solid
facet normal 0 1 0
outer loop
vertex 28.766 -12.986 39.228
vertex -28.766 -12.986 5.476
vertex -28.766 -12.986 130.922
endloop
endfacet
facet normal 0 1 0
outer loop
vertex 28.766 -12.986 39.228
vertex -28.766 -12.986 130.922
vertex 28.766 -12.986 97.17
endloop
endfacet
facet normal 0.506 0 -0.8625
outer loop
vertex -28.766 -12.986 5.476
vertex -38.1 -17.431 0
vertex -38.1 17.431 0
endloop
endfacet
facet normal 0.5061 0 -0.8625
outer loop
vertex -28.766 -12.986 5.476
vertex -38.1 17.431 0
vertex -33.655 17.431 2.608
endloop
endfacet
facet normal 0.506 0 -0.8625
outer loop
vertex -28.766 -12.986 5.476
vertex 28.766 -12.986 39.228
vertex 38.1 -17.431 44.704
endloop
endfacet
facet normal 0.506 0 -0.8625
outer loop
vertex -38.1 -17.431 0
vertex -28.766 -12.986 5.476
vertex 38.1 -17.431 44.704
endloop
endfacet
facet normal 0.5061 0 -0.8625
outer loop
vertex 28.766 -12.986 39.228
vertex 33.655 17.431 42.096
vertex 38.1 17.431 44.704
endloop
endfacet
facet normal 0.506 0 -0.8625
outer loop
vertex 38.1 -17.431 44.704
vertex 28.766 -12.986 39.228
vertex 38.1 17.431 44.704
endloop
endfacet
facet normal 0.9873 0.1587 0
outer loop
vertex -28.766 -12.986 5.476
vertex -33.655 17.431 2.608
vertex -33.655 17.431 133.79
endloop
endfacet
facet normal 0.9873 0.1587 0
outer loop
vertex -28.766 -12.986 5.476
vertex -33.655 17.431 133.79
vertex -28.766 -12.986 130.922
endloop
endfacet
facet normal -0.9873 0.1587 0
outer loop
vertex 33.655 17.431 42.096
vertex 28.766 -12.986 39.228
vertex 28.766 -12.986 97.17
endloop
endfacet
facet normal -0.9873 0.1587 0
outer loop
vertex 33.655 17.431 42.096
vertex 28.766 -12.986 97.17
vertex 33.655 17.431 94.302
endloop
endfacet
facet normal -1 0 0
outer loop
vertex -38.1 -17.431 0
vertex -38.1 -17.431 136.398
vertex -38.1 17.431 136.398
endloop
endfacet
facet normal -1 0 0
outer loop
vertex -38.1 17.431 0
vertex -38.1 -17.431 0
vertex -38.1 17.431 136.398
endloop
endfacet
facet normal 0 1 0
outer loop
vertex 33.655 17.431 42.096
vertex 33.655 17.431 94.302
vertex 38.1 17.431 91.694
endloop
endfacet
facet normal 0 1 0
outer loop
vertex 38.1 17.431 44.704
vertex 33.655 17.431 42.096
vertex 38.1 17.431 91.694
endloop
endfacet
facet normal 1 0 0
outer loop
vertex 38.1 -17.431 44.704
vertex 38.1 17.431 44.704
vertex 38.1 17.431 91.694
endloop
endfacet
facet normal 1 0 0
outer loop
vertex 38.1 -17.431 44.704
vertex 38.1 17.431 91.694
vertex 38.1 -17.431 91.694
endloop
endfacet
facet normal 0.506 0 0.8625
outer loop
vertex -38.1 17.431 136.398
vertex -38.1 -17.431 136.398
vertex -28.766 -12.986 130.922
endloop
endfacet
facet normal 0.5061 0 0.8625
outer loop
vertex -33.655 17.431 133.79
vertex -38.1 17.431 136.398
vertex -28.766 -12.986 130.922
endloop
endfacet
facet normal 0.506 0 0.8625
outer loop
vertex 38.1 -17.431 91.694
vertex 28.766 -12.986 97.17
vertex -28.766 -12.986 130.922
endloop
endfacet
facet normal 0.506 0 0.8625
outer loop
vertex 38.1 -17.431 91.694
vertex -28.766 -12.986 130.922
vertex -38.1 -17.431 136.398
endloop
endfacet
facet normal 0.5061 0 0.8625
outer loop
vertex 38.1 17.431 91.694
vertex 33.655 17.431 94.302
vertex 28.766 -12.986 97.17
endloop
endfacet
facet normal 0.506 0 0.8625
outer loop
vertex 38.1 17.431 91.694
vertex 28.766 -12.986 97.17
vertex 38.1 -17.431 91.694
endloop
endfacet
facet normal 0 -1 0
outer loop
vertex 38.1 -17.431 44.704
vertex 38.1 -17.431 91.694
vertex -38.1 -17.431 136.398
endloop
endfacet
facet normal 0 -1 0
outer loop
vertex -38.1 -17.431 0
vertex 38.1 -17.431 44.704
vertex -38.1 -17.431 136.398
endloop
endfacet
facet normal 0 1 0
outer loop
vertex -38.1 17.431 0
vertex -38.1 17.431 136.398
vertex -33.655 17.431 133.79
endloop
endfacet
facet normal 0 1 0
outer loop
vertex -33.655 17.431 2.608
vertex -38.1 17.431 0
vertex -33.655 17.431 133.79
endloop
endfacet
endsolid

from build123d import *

# Parameters (mm, degrees)
BOSS_EXTRUDE1_DEPTH     = 136.398
CUT_EXTRUDE1_DEPTH      = 18.43075
CUT_EXTRUDE1_DEPTH_BACK = 18.43075


with BuildPart() as part:
    # Sketch1 → Boss-Extrude1 (new body)
    with BuildSketch(Plane.XY):
        Polygon((-28.7655, -12.98575), (28.7655, -12.98575), (33.655, 17.43075), (38.1, 17.43075), (38.1, -17.43075), (-38.1, -17.43075), (-38.1, 17.43075), (-33.655, 17.43075), align=None)
    extrude(amount=BOSS_EXTRUDE1_DEPTH)

    # Sketch2 → Cut-Extrude1 (cut, two sides)
    with BuildSketch(Plane(origin=(0, 0, 0), x_dir=(1, 0, 0), z_dir=(0, 1, 0))) as cut_extrude1_sk:
        Polygon((-38.1, 0), (38.1, -44.704), (38.1, 0), align=None)
        Polygon((-38.1, -136.398), (38.1, -91.694), (38.1, -136.398), align=None)
    extrude(amount=CUT_EXTRUDE1_DEPTH, mode=Mode.SUBTRACT)
    extrude(cut_extrude1_sk.sketch, amount=-CUT_EXTRUDE1_DEPTH_BACK, mode=Mode.SUBTRACT)


solid = part.part
